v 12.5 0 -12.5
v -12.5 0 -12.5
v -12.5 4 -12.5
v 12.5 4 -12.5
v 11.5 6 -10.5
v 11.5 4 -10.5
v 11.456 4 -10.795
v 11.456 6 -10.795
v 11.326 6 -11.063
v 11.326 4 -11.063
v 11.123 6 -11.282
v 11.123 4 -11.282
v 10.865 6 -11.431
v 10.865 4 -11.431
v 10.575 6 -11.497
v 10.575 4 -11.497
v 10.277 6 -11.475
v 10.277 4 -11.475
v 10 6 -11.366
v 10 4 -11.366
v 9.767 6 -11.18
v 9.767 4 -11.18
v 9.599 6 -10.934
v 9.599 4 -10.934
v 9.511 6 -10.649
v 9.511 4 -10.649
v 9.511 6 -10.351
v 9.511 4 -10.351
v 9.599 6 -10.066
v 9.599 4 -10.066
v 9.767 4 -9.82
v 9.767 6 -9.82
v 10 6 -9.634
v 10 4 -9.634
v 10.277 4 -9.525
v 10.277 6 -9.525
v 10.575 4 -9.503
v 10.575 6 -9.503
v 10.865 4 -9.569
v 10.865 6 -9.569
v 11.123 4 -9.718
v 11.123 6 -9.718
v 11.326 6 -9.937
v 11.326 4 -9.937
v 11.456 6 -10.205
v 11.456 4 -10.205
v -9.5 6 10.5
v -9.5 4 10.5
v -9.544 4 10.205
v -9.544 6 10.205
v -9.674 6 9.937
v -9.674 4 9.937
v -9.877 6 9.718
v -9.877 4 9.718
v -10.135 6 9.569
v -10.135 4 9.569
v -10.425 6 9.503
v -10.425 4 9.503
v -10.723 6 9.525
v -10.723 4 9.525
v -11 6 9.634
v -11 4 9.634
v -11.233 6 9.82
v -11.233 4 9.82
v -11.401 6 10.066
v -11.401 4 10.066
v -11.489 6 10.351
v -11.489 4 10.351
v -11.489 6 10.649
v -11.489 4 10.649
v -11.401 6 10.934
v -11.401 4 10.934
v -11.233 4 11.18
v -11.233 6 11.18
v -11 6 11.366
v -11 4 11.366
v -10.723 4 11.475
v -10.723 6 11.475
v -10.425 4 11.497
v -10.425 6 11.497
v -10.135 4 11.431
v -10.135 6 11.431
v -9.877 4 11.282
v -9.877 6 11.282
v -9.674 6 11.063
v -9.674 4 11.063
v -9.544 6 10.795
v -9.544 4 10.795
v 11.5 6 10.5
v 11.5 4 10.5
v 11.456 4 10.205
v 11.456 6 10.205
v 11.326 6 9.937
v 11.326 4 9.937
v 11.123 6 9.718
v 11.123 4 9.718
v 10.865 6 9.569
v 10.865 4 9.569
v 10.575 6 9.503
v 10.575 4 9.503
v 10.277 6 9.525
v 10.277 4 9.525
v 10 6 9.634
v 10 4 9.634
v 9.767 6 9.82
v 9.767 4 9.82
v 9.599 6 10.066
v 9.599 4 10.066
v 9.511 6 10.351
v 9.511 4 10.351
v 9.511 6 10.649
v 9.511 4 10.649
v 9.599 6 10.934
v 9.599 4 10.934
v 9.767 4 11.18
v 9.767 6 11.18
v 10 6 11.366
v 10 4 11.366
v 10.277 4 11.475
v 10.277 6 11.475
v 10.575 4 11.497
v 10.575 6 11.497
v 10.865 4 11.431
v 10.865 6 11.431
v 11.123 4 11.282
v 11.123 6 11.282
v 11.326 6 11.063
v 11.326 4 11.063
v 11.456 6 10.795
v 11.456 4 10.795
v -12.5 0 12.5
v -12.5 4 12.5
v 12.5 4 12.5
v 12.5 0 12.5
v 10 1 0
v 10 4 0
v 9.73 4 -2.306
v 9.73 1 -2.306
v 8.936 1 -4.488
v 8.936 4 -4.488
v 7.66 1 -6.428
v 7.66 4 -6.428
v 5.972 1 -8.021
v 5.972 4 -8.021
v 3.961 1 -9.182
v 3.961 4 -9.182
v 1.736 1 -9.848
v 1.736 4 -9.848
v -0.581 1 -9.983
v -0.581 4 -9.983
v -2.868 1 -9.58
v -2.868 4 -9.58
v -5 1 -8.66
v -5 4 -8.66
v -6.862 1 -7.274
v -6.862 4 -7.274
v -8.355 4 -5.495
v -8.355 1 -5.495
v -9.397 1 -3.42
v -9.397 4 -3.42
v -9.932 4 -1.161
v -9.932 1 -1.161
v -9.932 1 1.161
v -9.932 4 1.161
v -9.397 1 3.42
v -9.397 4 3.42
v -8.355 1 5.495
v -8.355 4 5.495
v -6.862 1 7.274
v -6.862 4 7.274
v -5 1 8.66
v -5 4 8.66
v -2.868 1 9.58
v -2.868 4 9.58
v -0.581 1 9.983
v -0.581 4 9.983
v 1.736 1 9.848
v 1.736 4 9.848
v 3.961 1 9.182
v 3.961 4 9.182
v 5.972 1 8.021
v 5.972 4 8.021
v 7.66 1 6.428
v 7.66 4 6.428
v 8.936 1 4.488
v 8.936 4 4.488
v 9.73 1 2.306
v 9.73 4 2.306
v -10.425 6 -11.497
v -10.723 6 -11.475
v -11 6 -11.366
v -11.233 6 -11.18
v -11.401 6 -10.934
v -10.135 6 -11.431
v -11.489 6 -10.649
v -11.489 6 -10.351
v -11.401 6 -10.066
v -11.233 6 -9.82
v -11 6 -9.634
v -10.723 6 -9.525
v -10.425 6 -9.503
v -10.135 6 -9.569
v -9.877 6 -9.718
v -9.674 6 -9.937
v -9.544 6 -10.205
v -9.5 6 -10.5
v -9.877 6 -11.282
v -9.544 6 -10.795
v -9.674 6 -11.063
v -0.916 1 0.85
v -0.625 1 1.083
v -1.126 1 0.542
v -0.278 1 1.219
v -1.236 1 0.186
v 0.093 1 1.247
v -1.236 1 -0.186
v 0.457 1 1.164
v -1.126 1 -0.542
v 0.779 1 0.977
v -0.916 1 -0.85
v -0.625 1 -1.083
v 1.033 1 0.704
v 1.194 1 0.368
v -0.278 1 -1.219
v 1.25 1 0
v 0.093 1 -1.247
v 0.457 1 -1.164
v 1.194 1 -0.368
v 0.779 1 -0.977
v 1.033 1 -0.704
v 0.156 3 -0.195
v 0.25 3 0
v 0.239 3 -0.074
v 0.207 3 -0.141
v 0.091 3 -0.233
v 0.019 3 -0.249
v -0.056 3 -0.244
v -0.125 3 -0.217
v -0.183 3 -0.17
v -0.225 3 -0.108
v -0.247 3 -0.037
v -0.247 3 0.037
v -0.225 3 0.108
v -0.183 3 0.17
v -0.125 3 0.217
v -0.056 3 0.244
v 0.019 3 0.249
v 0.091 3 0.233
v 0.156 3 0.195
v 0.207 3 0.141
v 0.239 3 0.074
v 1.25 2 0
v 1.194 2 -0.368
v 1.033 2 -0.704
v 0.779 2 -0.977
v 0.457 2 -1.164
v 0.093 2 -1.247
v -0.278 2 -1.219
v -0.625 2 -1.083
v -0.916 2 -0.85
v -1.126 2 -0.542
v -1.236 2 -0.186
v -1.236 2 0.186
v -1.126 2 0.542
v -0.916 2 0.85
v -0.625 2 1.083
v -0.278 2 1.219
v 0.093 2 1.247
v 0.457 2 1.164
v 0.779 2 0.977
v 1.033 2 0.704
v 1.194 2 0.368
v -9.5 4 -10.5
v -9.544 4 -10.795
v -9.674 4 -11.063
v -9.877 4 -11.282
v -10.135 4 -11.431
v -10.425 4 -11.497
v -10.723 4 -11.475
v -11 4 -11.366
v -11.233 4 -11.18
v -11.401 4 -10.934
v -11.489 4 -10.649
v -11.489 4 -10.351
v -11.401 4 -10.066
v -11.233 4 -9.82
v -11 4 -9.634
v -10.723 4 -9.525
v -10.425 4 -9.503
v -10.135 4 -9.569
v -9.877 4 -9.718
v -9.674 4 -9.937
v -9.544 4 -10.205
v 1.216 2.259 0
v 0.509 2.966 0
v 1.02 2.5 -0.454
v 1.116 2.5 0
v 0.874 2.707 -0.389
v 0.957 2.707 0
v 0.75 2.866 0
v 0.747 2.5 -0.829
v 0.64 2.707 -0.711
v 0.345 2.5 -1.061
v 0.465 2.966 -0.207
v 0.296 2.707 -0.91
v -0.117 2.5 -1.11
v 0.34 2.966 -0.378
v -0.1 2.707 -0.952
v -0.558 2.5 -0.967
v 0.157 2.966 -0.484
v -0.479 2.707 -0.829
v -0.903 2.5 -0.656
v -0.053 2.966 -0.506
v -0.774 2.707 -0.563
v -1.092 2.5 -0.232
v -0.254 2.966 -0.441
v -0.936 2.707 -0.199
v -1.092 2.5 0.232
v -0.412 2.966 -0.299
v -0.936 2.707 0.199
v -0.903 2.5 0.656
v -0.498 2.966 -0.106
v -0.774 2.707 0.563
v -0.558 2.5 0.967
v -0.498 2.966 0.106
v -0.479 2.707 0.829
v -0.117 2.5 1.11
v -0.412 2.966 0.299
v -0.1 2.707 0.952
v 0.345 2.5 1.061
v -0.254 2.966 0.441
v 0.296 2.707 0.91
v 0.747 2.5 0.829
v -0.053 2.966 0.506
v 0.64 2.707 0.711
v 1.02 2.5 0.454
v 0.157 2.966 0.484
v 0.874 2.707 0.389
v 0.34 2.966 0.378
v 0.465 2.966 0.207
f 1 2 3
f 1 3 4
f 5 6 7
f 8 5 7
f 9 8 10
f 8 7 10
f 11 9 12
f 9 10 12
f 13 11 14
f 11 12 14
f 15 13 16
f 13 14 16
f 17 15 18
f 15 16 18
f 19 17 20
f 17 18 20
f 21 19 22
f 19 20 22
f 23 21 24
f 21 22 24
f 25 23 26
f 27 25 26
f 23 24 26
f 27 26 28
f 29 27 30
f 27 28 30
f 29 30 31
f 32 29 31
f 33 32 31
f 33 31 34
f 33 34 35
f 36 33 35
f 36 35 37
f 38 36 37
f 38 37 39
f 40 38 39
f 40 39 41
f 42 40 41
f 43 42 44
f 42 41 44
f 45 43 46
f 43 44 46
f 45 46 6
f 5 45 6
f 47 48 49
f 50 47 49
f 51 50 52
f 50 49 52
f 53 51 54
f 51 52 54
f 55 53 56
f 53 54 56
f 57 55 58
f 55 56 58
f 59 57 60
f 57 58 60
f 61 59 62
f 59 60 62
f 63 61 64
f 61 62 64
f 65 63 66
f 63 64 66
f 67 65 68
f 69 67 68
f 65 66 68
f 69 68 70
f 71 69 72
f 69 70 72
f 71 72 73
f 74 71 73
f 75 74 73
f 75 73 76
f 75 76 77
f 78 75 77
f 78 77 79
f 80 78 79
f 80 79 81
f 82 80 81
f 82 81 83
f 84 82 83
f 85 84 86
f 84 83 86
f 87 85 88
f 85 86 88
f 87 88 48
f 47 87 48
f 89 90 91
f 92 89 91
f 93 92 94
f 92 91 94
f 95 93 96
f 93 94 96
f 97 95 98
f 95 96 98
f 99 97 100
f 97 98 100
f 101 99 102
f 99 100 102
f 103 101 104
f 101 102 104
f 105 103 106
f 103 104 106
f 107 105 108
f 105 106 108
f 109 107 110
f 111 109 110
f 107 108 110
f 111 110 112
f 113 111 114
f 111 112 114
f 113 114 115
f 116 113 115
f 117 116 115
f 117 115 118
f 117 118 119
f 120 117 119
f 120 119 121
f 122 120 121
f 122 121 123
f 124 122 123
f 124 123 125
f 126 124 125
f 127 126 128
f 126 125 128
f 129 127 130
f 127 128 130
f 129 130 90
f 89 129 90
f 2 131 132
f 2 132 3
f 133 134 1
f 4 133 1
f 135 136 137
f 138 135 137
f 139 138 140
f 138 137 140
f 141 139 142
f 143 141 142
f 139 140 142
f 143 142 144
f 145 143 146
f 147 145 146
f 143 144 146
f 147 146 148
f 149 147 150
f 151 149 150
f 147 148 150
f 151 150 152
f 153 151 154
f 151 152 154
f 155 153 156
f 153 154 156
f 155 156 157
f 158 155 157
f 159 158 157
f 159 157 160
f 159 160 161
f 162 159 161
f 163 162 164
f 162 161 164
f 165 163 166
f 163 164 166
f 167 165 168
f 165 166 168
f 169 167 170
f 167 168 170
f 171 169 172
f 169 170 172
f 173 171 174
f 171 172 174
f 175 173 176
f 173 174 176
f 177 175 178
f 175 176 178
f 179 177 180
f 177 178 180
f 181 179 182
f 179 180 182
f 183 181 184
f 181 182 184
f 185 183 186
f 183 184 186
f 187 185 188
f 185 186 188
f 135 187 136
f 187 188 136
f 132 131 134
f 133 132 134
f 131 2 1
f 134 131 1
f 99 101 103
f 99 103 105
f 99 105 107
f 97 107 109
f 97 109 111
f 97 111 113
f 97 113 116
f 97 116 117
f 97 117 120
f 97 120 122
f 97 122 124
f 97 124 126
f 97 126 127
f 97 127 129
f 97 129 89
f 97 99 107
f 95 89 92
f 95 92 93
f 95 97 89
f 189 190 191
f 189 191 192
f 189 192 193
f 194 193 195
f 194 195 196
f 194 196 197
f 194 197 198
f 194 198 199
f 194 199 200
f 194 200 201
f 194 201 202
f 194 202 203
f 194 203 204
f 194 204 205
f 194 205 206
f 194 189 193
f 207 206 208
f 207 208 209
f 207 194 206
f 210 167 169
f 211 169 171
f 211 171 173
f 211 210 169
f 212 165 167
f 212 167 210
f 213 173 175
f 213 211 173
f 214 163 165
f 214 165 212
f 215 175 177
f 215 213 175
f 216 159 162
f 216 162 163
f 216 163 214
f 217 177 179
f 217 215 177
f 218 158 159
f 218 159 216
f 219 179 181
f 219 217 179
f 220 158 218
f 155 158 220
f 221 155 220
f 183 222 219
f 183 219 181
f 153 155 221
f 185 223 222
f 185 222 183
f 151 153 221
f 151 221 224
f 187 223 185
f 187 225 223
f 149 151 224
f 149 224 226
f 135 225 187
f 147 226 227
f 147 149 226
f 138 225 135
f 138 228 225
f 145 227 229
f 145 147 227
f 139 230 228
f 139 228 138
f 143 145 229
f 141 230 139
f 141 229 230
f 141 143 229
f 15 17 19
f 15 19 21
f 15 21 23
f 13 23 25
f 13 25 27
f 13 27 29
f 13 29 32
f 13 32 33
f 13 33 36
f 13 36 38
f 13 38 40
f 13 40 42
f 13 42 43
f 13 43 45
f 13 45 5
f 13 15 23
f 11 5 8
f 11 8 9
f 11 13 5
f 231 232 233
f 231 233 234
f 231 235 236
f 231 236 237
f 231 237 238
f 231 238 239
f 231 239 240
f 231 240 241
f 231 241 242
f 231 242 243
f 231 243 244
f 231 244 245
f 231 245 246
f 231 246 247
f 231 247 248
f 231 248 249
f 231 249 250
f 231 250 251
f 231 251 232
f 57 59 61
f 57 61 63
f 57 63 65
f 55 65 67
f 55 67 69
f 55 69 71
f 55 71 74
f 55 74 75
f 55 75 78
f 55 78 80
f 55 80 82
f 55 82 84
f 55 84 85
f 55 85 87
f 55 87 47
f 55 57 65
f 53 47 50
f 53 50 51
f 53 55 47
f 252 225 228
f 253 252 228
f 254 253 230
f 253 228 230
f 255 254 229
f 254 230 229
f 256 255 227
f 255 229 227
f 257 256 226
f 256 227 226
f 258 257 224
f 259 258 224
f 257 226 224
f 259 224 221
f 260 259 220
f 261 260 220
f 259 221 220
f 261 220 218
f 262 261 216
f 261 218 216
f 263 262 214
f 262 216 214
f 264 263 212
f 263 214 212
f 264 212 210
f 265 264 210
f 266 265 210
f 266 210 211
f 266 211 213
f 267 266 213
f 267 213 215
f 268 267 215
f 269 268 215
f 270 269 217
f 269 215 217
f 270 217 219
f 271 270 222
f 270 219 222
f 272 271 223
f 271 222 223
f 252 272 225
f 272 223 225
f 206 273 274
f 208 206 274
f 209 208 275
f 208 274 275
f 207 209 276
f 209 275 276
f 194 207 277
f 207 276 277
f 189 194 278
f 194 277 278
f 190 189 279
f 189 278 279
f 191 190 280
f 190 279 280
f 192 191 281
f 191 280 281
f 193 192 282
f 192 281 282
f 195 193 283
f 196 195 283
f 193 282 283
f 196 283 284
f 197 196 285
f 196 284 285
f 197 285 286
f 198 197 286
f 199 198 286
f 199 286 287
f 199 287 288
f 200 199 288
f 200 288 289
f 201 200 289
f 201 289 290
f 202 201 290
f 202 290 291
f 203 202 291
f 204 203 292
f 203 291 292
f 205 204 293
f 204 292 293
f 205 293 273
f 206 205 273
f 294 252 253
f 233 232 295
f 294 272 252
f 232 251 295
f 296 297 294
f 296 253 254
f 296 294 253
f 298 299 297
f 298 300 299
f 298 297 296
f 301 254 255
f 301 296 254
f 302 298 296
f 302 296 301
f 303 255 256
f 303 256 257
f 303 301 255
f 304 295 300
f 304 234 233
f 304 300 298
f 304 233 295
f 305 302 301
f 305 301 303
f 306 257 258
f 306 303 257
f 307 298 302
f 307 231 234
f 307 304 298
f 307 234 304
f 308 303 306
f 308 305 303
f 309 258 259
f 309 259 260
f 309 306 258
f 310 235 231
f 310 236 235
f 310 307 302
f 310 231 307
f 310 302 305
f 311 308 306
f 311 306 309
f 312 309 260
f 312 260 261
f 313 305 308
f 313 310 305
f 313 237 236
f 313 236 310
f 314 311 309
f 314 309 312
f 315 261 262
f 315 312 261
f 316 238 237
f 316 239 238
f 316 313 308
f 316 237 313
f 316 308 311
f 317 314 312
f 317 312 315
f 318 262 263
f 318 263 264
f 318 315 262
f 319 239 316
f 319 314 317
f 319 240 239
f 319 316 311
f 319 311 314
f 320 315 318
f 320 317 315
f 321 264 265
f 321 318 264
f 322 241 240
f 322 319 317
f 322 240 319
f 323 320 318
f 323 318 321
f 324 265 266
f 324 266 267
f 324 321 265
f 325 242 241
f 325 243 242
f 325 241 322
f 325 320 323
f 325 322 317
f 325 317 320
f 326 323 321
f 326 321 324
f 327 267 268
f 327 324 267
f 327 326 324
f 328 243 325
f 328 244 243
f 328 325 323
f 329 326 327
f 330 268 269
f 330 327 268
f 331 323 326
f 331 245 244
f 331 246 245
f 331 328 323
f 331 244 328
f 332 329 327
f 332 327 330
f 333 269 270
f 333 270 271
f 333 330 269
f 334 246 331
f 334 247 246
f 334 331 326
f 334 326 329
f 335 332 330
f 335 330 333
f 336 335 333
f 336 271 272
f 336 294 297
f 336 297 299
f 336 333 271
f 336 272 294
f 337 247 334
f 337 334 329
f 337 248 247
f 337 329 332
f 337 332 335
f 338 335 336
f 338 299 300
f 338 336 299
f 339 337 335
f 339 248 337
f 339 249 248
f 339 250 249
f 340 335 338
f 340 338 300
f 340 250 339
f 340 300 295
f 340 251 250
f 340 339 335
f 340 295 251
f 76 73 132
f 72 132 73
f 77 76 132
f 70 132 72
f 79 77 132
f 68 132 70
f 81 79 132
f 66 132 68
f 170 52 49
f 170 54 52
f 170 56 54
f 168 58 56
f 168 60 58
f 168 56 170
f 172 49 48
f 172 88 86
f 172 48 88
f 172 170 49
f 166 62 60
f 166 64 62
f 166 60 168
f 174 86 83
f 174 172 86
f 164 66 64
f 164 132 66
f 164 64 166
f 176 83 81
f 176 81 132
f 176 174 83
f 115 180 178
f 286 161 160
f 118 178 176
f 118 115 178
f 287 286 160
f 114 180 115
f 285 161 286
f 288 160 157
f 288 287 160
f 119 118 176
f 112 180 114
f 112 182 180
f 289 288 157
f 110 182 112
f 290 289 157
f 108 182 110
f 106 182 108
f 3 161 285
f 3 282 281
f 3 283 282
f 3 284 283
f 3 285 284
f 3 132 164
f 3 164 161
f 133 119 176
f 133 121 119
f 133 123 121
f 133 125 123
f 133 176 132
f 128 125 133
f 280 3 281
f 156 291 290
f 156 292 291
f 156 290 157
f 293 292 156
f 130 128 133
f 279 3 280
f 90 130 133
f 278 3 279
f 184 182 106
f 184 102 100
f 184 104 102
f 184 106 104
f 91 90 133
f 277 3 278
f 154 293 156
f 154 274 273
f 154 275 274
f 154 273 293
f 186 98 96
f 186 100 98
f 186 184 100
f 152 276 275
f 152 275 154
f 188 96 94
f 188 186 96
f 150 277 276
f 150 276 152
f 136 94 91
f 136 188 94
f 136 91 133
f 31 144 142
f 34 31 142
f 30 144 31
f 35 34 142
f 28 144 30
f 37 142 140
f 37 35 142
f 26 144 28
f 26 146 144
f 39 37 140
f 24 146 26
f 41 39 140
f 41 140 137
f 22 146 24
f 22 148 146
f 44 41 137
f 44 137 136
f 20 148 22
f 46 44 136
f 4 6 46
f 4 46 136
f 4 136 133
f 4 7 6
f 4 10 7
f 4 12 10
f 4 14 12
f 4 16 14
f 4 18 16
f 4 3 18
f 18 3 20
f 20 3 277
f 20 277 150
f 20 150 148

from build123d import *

# Parameters (mm, degrees)
SKETCH1_W           = 25
SKETCH1_H           = 25
BOSS_EXTRUDE1_DEPTH = 4
SKETCH2_R           = 10
CUT_EXTRUDE1_DEPTH  = 3
SKETCH3_R           = 1.25
BOSS_EXTRUDE2_DEPTH = 2
FILLET1_R           = 1
SKETCH4_R           = 1
BOSS_EXTRUDE3_DEPTH = 2


with BuildPart() as part:
    # Sketch1 → Boss-Extrude1 (new body)
    with BuildSketch(Plane(origin=(0, 0, 0), x_dir=(1, 0, 0), z_dir=(0, 1, 0))):
        Rectangle(SKETCH1_W, SKETCH1_H)
    extrude(amount=BOSS_EXTRUDE1_DEPTH)

    # Sketch2 → Cut-Extrude1 (cut)
    with BuildSketch(Plane(origin=(0, 4, 0), x_dir=(1, 0, 0), z_dir=(0, 1, 0))):
        Circle(SKETCH2_R)
    extrude(amount=-CUT_EXTRUDE1_DEPTH, mode=Mode.SUBTRACT)

    # Sketch3 → Boss-Extrude2 (add)
    with BuildSketch(Plane(origin=(0, 1, 0), x_dir=(1, 0, 0), z_dir=(0, 1, 0))):
        Circle(SKETCH3_R)
    extrude(amount=BOSS_EXTRUDE2_DEPTH)

    # Fillet1
    fillet1_edges = [part.edges().sort_by_distance(p)[0] for p in [
        (-1.25, 3, 0),
    ]]
    fillet(fillet1_edges, radius=FILLET1_R)

    # Sketch4 → Boss-Extrude3 (add)
    with BuildSketch(Plane(origin=(0, 4, 0), x_dir=(1, 0, 0), z_dir=(0, 1, 0))):
        with Locations((-10.5, 10.5)):
            Circle(SKETCH4_R)
        with Locations((10.5, 10.5)):
            Circle(SKETCH4_R)
        with Locations((10.5, -10.5)):
            Circle(SKETCH4_R)
        with Locations((-10.5, -10.5)):
            Circle(SKETCH4_R)
    extrude(amount=BOSS_EXTRUDE3_DEPTH)


solid = part.part
